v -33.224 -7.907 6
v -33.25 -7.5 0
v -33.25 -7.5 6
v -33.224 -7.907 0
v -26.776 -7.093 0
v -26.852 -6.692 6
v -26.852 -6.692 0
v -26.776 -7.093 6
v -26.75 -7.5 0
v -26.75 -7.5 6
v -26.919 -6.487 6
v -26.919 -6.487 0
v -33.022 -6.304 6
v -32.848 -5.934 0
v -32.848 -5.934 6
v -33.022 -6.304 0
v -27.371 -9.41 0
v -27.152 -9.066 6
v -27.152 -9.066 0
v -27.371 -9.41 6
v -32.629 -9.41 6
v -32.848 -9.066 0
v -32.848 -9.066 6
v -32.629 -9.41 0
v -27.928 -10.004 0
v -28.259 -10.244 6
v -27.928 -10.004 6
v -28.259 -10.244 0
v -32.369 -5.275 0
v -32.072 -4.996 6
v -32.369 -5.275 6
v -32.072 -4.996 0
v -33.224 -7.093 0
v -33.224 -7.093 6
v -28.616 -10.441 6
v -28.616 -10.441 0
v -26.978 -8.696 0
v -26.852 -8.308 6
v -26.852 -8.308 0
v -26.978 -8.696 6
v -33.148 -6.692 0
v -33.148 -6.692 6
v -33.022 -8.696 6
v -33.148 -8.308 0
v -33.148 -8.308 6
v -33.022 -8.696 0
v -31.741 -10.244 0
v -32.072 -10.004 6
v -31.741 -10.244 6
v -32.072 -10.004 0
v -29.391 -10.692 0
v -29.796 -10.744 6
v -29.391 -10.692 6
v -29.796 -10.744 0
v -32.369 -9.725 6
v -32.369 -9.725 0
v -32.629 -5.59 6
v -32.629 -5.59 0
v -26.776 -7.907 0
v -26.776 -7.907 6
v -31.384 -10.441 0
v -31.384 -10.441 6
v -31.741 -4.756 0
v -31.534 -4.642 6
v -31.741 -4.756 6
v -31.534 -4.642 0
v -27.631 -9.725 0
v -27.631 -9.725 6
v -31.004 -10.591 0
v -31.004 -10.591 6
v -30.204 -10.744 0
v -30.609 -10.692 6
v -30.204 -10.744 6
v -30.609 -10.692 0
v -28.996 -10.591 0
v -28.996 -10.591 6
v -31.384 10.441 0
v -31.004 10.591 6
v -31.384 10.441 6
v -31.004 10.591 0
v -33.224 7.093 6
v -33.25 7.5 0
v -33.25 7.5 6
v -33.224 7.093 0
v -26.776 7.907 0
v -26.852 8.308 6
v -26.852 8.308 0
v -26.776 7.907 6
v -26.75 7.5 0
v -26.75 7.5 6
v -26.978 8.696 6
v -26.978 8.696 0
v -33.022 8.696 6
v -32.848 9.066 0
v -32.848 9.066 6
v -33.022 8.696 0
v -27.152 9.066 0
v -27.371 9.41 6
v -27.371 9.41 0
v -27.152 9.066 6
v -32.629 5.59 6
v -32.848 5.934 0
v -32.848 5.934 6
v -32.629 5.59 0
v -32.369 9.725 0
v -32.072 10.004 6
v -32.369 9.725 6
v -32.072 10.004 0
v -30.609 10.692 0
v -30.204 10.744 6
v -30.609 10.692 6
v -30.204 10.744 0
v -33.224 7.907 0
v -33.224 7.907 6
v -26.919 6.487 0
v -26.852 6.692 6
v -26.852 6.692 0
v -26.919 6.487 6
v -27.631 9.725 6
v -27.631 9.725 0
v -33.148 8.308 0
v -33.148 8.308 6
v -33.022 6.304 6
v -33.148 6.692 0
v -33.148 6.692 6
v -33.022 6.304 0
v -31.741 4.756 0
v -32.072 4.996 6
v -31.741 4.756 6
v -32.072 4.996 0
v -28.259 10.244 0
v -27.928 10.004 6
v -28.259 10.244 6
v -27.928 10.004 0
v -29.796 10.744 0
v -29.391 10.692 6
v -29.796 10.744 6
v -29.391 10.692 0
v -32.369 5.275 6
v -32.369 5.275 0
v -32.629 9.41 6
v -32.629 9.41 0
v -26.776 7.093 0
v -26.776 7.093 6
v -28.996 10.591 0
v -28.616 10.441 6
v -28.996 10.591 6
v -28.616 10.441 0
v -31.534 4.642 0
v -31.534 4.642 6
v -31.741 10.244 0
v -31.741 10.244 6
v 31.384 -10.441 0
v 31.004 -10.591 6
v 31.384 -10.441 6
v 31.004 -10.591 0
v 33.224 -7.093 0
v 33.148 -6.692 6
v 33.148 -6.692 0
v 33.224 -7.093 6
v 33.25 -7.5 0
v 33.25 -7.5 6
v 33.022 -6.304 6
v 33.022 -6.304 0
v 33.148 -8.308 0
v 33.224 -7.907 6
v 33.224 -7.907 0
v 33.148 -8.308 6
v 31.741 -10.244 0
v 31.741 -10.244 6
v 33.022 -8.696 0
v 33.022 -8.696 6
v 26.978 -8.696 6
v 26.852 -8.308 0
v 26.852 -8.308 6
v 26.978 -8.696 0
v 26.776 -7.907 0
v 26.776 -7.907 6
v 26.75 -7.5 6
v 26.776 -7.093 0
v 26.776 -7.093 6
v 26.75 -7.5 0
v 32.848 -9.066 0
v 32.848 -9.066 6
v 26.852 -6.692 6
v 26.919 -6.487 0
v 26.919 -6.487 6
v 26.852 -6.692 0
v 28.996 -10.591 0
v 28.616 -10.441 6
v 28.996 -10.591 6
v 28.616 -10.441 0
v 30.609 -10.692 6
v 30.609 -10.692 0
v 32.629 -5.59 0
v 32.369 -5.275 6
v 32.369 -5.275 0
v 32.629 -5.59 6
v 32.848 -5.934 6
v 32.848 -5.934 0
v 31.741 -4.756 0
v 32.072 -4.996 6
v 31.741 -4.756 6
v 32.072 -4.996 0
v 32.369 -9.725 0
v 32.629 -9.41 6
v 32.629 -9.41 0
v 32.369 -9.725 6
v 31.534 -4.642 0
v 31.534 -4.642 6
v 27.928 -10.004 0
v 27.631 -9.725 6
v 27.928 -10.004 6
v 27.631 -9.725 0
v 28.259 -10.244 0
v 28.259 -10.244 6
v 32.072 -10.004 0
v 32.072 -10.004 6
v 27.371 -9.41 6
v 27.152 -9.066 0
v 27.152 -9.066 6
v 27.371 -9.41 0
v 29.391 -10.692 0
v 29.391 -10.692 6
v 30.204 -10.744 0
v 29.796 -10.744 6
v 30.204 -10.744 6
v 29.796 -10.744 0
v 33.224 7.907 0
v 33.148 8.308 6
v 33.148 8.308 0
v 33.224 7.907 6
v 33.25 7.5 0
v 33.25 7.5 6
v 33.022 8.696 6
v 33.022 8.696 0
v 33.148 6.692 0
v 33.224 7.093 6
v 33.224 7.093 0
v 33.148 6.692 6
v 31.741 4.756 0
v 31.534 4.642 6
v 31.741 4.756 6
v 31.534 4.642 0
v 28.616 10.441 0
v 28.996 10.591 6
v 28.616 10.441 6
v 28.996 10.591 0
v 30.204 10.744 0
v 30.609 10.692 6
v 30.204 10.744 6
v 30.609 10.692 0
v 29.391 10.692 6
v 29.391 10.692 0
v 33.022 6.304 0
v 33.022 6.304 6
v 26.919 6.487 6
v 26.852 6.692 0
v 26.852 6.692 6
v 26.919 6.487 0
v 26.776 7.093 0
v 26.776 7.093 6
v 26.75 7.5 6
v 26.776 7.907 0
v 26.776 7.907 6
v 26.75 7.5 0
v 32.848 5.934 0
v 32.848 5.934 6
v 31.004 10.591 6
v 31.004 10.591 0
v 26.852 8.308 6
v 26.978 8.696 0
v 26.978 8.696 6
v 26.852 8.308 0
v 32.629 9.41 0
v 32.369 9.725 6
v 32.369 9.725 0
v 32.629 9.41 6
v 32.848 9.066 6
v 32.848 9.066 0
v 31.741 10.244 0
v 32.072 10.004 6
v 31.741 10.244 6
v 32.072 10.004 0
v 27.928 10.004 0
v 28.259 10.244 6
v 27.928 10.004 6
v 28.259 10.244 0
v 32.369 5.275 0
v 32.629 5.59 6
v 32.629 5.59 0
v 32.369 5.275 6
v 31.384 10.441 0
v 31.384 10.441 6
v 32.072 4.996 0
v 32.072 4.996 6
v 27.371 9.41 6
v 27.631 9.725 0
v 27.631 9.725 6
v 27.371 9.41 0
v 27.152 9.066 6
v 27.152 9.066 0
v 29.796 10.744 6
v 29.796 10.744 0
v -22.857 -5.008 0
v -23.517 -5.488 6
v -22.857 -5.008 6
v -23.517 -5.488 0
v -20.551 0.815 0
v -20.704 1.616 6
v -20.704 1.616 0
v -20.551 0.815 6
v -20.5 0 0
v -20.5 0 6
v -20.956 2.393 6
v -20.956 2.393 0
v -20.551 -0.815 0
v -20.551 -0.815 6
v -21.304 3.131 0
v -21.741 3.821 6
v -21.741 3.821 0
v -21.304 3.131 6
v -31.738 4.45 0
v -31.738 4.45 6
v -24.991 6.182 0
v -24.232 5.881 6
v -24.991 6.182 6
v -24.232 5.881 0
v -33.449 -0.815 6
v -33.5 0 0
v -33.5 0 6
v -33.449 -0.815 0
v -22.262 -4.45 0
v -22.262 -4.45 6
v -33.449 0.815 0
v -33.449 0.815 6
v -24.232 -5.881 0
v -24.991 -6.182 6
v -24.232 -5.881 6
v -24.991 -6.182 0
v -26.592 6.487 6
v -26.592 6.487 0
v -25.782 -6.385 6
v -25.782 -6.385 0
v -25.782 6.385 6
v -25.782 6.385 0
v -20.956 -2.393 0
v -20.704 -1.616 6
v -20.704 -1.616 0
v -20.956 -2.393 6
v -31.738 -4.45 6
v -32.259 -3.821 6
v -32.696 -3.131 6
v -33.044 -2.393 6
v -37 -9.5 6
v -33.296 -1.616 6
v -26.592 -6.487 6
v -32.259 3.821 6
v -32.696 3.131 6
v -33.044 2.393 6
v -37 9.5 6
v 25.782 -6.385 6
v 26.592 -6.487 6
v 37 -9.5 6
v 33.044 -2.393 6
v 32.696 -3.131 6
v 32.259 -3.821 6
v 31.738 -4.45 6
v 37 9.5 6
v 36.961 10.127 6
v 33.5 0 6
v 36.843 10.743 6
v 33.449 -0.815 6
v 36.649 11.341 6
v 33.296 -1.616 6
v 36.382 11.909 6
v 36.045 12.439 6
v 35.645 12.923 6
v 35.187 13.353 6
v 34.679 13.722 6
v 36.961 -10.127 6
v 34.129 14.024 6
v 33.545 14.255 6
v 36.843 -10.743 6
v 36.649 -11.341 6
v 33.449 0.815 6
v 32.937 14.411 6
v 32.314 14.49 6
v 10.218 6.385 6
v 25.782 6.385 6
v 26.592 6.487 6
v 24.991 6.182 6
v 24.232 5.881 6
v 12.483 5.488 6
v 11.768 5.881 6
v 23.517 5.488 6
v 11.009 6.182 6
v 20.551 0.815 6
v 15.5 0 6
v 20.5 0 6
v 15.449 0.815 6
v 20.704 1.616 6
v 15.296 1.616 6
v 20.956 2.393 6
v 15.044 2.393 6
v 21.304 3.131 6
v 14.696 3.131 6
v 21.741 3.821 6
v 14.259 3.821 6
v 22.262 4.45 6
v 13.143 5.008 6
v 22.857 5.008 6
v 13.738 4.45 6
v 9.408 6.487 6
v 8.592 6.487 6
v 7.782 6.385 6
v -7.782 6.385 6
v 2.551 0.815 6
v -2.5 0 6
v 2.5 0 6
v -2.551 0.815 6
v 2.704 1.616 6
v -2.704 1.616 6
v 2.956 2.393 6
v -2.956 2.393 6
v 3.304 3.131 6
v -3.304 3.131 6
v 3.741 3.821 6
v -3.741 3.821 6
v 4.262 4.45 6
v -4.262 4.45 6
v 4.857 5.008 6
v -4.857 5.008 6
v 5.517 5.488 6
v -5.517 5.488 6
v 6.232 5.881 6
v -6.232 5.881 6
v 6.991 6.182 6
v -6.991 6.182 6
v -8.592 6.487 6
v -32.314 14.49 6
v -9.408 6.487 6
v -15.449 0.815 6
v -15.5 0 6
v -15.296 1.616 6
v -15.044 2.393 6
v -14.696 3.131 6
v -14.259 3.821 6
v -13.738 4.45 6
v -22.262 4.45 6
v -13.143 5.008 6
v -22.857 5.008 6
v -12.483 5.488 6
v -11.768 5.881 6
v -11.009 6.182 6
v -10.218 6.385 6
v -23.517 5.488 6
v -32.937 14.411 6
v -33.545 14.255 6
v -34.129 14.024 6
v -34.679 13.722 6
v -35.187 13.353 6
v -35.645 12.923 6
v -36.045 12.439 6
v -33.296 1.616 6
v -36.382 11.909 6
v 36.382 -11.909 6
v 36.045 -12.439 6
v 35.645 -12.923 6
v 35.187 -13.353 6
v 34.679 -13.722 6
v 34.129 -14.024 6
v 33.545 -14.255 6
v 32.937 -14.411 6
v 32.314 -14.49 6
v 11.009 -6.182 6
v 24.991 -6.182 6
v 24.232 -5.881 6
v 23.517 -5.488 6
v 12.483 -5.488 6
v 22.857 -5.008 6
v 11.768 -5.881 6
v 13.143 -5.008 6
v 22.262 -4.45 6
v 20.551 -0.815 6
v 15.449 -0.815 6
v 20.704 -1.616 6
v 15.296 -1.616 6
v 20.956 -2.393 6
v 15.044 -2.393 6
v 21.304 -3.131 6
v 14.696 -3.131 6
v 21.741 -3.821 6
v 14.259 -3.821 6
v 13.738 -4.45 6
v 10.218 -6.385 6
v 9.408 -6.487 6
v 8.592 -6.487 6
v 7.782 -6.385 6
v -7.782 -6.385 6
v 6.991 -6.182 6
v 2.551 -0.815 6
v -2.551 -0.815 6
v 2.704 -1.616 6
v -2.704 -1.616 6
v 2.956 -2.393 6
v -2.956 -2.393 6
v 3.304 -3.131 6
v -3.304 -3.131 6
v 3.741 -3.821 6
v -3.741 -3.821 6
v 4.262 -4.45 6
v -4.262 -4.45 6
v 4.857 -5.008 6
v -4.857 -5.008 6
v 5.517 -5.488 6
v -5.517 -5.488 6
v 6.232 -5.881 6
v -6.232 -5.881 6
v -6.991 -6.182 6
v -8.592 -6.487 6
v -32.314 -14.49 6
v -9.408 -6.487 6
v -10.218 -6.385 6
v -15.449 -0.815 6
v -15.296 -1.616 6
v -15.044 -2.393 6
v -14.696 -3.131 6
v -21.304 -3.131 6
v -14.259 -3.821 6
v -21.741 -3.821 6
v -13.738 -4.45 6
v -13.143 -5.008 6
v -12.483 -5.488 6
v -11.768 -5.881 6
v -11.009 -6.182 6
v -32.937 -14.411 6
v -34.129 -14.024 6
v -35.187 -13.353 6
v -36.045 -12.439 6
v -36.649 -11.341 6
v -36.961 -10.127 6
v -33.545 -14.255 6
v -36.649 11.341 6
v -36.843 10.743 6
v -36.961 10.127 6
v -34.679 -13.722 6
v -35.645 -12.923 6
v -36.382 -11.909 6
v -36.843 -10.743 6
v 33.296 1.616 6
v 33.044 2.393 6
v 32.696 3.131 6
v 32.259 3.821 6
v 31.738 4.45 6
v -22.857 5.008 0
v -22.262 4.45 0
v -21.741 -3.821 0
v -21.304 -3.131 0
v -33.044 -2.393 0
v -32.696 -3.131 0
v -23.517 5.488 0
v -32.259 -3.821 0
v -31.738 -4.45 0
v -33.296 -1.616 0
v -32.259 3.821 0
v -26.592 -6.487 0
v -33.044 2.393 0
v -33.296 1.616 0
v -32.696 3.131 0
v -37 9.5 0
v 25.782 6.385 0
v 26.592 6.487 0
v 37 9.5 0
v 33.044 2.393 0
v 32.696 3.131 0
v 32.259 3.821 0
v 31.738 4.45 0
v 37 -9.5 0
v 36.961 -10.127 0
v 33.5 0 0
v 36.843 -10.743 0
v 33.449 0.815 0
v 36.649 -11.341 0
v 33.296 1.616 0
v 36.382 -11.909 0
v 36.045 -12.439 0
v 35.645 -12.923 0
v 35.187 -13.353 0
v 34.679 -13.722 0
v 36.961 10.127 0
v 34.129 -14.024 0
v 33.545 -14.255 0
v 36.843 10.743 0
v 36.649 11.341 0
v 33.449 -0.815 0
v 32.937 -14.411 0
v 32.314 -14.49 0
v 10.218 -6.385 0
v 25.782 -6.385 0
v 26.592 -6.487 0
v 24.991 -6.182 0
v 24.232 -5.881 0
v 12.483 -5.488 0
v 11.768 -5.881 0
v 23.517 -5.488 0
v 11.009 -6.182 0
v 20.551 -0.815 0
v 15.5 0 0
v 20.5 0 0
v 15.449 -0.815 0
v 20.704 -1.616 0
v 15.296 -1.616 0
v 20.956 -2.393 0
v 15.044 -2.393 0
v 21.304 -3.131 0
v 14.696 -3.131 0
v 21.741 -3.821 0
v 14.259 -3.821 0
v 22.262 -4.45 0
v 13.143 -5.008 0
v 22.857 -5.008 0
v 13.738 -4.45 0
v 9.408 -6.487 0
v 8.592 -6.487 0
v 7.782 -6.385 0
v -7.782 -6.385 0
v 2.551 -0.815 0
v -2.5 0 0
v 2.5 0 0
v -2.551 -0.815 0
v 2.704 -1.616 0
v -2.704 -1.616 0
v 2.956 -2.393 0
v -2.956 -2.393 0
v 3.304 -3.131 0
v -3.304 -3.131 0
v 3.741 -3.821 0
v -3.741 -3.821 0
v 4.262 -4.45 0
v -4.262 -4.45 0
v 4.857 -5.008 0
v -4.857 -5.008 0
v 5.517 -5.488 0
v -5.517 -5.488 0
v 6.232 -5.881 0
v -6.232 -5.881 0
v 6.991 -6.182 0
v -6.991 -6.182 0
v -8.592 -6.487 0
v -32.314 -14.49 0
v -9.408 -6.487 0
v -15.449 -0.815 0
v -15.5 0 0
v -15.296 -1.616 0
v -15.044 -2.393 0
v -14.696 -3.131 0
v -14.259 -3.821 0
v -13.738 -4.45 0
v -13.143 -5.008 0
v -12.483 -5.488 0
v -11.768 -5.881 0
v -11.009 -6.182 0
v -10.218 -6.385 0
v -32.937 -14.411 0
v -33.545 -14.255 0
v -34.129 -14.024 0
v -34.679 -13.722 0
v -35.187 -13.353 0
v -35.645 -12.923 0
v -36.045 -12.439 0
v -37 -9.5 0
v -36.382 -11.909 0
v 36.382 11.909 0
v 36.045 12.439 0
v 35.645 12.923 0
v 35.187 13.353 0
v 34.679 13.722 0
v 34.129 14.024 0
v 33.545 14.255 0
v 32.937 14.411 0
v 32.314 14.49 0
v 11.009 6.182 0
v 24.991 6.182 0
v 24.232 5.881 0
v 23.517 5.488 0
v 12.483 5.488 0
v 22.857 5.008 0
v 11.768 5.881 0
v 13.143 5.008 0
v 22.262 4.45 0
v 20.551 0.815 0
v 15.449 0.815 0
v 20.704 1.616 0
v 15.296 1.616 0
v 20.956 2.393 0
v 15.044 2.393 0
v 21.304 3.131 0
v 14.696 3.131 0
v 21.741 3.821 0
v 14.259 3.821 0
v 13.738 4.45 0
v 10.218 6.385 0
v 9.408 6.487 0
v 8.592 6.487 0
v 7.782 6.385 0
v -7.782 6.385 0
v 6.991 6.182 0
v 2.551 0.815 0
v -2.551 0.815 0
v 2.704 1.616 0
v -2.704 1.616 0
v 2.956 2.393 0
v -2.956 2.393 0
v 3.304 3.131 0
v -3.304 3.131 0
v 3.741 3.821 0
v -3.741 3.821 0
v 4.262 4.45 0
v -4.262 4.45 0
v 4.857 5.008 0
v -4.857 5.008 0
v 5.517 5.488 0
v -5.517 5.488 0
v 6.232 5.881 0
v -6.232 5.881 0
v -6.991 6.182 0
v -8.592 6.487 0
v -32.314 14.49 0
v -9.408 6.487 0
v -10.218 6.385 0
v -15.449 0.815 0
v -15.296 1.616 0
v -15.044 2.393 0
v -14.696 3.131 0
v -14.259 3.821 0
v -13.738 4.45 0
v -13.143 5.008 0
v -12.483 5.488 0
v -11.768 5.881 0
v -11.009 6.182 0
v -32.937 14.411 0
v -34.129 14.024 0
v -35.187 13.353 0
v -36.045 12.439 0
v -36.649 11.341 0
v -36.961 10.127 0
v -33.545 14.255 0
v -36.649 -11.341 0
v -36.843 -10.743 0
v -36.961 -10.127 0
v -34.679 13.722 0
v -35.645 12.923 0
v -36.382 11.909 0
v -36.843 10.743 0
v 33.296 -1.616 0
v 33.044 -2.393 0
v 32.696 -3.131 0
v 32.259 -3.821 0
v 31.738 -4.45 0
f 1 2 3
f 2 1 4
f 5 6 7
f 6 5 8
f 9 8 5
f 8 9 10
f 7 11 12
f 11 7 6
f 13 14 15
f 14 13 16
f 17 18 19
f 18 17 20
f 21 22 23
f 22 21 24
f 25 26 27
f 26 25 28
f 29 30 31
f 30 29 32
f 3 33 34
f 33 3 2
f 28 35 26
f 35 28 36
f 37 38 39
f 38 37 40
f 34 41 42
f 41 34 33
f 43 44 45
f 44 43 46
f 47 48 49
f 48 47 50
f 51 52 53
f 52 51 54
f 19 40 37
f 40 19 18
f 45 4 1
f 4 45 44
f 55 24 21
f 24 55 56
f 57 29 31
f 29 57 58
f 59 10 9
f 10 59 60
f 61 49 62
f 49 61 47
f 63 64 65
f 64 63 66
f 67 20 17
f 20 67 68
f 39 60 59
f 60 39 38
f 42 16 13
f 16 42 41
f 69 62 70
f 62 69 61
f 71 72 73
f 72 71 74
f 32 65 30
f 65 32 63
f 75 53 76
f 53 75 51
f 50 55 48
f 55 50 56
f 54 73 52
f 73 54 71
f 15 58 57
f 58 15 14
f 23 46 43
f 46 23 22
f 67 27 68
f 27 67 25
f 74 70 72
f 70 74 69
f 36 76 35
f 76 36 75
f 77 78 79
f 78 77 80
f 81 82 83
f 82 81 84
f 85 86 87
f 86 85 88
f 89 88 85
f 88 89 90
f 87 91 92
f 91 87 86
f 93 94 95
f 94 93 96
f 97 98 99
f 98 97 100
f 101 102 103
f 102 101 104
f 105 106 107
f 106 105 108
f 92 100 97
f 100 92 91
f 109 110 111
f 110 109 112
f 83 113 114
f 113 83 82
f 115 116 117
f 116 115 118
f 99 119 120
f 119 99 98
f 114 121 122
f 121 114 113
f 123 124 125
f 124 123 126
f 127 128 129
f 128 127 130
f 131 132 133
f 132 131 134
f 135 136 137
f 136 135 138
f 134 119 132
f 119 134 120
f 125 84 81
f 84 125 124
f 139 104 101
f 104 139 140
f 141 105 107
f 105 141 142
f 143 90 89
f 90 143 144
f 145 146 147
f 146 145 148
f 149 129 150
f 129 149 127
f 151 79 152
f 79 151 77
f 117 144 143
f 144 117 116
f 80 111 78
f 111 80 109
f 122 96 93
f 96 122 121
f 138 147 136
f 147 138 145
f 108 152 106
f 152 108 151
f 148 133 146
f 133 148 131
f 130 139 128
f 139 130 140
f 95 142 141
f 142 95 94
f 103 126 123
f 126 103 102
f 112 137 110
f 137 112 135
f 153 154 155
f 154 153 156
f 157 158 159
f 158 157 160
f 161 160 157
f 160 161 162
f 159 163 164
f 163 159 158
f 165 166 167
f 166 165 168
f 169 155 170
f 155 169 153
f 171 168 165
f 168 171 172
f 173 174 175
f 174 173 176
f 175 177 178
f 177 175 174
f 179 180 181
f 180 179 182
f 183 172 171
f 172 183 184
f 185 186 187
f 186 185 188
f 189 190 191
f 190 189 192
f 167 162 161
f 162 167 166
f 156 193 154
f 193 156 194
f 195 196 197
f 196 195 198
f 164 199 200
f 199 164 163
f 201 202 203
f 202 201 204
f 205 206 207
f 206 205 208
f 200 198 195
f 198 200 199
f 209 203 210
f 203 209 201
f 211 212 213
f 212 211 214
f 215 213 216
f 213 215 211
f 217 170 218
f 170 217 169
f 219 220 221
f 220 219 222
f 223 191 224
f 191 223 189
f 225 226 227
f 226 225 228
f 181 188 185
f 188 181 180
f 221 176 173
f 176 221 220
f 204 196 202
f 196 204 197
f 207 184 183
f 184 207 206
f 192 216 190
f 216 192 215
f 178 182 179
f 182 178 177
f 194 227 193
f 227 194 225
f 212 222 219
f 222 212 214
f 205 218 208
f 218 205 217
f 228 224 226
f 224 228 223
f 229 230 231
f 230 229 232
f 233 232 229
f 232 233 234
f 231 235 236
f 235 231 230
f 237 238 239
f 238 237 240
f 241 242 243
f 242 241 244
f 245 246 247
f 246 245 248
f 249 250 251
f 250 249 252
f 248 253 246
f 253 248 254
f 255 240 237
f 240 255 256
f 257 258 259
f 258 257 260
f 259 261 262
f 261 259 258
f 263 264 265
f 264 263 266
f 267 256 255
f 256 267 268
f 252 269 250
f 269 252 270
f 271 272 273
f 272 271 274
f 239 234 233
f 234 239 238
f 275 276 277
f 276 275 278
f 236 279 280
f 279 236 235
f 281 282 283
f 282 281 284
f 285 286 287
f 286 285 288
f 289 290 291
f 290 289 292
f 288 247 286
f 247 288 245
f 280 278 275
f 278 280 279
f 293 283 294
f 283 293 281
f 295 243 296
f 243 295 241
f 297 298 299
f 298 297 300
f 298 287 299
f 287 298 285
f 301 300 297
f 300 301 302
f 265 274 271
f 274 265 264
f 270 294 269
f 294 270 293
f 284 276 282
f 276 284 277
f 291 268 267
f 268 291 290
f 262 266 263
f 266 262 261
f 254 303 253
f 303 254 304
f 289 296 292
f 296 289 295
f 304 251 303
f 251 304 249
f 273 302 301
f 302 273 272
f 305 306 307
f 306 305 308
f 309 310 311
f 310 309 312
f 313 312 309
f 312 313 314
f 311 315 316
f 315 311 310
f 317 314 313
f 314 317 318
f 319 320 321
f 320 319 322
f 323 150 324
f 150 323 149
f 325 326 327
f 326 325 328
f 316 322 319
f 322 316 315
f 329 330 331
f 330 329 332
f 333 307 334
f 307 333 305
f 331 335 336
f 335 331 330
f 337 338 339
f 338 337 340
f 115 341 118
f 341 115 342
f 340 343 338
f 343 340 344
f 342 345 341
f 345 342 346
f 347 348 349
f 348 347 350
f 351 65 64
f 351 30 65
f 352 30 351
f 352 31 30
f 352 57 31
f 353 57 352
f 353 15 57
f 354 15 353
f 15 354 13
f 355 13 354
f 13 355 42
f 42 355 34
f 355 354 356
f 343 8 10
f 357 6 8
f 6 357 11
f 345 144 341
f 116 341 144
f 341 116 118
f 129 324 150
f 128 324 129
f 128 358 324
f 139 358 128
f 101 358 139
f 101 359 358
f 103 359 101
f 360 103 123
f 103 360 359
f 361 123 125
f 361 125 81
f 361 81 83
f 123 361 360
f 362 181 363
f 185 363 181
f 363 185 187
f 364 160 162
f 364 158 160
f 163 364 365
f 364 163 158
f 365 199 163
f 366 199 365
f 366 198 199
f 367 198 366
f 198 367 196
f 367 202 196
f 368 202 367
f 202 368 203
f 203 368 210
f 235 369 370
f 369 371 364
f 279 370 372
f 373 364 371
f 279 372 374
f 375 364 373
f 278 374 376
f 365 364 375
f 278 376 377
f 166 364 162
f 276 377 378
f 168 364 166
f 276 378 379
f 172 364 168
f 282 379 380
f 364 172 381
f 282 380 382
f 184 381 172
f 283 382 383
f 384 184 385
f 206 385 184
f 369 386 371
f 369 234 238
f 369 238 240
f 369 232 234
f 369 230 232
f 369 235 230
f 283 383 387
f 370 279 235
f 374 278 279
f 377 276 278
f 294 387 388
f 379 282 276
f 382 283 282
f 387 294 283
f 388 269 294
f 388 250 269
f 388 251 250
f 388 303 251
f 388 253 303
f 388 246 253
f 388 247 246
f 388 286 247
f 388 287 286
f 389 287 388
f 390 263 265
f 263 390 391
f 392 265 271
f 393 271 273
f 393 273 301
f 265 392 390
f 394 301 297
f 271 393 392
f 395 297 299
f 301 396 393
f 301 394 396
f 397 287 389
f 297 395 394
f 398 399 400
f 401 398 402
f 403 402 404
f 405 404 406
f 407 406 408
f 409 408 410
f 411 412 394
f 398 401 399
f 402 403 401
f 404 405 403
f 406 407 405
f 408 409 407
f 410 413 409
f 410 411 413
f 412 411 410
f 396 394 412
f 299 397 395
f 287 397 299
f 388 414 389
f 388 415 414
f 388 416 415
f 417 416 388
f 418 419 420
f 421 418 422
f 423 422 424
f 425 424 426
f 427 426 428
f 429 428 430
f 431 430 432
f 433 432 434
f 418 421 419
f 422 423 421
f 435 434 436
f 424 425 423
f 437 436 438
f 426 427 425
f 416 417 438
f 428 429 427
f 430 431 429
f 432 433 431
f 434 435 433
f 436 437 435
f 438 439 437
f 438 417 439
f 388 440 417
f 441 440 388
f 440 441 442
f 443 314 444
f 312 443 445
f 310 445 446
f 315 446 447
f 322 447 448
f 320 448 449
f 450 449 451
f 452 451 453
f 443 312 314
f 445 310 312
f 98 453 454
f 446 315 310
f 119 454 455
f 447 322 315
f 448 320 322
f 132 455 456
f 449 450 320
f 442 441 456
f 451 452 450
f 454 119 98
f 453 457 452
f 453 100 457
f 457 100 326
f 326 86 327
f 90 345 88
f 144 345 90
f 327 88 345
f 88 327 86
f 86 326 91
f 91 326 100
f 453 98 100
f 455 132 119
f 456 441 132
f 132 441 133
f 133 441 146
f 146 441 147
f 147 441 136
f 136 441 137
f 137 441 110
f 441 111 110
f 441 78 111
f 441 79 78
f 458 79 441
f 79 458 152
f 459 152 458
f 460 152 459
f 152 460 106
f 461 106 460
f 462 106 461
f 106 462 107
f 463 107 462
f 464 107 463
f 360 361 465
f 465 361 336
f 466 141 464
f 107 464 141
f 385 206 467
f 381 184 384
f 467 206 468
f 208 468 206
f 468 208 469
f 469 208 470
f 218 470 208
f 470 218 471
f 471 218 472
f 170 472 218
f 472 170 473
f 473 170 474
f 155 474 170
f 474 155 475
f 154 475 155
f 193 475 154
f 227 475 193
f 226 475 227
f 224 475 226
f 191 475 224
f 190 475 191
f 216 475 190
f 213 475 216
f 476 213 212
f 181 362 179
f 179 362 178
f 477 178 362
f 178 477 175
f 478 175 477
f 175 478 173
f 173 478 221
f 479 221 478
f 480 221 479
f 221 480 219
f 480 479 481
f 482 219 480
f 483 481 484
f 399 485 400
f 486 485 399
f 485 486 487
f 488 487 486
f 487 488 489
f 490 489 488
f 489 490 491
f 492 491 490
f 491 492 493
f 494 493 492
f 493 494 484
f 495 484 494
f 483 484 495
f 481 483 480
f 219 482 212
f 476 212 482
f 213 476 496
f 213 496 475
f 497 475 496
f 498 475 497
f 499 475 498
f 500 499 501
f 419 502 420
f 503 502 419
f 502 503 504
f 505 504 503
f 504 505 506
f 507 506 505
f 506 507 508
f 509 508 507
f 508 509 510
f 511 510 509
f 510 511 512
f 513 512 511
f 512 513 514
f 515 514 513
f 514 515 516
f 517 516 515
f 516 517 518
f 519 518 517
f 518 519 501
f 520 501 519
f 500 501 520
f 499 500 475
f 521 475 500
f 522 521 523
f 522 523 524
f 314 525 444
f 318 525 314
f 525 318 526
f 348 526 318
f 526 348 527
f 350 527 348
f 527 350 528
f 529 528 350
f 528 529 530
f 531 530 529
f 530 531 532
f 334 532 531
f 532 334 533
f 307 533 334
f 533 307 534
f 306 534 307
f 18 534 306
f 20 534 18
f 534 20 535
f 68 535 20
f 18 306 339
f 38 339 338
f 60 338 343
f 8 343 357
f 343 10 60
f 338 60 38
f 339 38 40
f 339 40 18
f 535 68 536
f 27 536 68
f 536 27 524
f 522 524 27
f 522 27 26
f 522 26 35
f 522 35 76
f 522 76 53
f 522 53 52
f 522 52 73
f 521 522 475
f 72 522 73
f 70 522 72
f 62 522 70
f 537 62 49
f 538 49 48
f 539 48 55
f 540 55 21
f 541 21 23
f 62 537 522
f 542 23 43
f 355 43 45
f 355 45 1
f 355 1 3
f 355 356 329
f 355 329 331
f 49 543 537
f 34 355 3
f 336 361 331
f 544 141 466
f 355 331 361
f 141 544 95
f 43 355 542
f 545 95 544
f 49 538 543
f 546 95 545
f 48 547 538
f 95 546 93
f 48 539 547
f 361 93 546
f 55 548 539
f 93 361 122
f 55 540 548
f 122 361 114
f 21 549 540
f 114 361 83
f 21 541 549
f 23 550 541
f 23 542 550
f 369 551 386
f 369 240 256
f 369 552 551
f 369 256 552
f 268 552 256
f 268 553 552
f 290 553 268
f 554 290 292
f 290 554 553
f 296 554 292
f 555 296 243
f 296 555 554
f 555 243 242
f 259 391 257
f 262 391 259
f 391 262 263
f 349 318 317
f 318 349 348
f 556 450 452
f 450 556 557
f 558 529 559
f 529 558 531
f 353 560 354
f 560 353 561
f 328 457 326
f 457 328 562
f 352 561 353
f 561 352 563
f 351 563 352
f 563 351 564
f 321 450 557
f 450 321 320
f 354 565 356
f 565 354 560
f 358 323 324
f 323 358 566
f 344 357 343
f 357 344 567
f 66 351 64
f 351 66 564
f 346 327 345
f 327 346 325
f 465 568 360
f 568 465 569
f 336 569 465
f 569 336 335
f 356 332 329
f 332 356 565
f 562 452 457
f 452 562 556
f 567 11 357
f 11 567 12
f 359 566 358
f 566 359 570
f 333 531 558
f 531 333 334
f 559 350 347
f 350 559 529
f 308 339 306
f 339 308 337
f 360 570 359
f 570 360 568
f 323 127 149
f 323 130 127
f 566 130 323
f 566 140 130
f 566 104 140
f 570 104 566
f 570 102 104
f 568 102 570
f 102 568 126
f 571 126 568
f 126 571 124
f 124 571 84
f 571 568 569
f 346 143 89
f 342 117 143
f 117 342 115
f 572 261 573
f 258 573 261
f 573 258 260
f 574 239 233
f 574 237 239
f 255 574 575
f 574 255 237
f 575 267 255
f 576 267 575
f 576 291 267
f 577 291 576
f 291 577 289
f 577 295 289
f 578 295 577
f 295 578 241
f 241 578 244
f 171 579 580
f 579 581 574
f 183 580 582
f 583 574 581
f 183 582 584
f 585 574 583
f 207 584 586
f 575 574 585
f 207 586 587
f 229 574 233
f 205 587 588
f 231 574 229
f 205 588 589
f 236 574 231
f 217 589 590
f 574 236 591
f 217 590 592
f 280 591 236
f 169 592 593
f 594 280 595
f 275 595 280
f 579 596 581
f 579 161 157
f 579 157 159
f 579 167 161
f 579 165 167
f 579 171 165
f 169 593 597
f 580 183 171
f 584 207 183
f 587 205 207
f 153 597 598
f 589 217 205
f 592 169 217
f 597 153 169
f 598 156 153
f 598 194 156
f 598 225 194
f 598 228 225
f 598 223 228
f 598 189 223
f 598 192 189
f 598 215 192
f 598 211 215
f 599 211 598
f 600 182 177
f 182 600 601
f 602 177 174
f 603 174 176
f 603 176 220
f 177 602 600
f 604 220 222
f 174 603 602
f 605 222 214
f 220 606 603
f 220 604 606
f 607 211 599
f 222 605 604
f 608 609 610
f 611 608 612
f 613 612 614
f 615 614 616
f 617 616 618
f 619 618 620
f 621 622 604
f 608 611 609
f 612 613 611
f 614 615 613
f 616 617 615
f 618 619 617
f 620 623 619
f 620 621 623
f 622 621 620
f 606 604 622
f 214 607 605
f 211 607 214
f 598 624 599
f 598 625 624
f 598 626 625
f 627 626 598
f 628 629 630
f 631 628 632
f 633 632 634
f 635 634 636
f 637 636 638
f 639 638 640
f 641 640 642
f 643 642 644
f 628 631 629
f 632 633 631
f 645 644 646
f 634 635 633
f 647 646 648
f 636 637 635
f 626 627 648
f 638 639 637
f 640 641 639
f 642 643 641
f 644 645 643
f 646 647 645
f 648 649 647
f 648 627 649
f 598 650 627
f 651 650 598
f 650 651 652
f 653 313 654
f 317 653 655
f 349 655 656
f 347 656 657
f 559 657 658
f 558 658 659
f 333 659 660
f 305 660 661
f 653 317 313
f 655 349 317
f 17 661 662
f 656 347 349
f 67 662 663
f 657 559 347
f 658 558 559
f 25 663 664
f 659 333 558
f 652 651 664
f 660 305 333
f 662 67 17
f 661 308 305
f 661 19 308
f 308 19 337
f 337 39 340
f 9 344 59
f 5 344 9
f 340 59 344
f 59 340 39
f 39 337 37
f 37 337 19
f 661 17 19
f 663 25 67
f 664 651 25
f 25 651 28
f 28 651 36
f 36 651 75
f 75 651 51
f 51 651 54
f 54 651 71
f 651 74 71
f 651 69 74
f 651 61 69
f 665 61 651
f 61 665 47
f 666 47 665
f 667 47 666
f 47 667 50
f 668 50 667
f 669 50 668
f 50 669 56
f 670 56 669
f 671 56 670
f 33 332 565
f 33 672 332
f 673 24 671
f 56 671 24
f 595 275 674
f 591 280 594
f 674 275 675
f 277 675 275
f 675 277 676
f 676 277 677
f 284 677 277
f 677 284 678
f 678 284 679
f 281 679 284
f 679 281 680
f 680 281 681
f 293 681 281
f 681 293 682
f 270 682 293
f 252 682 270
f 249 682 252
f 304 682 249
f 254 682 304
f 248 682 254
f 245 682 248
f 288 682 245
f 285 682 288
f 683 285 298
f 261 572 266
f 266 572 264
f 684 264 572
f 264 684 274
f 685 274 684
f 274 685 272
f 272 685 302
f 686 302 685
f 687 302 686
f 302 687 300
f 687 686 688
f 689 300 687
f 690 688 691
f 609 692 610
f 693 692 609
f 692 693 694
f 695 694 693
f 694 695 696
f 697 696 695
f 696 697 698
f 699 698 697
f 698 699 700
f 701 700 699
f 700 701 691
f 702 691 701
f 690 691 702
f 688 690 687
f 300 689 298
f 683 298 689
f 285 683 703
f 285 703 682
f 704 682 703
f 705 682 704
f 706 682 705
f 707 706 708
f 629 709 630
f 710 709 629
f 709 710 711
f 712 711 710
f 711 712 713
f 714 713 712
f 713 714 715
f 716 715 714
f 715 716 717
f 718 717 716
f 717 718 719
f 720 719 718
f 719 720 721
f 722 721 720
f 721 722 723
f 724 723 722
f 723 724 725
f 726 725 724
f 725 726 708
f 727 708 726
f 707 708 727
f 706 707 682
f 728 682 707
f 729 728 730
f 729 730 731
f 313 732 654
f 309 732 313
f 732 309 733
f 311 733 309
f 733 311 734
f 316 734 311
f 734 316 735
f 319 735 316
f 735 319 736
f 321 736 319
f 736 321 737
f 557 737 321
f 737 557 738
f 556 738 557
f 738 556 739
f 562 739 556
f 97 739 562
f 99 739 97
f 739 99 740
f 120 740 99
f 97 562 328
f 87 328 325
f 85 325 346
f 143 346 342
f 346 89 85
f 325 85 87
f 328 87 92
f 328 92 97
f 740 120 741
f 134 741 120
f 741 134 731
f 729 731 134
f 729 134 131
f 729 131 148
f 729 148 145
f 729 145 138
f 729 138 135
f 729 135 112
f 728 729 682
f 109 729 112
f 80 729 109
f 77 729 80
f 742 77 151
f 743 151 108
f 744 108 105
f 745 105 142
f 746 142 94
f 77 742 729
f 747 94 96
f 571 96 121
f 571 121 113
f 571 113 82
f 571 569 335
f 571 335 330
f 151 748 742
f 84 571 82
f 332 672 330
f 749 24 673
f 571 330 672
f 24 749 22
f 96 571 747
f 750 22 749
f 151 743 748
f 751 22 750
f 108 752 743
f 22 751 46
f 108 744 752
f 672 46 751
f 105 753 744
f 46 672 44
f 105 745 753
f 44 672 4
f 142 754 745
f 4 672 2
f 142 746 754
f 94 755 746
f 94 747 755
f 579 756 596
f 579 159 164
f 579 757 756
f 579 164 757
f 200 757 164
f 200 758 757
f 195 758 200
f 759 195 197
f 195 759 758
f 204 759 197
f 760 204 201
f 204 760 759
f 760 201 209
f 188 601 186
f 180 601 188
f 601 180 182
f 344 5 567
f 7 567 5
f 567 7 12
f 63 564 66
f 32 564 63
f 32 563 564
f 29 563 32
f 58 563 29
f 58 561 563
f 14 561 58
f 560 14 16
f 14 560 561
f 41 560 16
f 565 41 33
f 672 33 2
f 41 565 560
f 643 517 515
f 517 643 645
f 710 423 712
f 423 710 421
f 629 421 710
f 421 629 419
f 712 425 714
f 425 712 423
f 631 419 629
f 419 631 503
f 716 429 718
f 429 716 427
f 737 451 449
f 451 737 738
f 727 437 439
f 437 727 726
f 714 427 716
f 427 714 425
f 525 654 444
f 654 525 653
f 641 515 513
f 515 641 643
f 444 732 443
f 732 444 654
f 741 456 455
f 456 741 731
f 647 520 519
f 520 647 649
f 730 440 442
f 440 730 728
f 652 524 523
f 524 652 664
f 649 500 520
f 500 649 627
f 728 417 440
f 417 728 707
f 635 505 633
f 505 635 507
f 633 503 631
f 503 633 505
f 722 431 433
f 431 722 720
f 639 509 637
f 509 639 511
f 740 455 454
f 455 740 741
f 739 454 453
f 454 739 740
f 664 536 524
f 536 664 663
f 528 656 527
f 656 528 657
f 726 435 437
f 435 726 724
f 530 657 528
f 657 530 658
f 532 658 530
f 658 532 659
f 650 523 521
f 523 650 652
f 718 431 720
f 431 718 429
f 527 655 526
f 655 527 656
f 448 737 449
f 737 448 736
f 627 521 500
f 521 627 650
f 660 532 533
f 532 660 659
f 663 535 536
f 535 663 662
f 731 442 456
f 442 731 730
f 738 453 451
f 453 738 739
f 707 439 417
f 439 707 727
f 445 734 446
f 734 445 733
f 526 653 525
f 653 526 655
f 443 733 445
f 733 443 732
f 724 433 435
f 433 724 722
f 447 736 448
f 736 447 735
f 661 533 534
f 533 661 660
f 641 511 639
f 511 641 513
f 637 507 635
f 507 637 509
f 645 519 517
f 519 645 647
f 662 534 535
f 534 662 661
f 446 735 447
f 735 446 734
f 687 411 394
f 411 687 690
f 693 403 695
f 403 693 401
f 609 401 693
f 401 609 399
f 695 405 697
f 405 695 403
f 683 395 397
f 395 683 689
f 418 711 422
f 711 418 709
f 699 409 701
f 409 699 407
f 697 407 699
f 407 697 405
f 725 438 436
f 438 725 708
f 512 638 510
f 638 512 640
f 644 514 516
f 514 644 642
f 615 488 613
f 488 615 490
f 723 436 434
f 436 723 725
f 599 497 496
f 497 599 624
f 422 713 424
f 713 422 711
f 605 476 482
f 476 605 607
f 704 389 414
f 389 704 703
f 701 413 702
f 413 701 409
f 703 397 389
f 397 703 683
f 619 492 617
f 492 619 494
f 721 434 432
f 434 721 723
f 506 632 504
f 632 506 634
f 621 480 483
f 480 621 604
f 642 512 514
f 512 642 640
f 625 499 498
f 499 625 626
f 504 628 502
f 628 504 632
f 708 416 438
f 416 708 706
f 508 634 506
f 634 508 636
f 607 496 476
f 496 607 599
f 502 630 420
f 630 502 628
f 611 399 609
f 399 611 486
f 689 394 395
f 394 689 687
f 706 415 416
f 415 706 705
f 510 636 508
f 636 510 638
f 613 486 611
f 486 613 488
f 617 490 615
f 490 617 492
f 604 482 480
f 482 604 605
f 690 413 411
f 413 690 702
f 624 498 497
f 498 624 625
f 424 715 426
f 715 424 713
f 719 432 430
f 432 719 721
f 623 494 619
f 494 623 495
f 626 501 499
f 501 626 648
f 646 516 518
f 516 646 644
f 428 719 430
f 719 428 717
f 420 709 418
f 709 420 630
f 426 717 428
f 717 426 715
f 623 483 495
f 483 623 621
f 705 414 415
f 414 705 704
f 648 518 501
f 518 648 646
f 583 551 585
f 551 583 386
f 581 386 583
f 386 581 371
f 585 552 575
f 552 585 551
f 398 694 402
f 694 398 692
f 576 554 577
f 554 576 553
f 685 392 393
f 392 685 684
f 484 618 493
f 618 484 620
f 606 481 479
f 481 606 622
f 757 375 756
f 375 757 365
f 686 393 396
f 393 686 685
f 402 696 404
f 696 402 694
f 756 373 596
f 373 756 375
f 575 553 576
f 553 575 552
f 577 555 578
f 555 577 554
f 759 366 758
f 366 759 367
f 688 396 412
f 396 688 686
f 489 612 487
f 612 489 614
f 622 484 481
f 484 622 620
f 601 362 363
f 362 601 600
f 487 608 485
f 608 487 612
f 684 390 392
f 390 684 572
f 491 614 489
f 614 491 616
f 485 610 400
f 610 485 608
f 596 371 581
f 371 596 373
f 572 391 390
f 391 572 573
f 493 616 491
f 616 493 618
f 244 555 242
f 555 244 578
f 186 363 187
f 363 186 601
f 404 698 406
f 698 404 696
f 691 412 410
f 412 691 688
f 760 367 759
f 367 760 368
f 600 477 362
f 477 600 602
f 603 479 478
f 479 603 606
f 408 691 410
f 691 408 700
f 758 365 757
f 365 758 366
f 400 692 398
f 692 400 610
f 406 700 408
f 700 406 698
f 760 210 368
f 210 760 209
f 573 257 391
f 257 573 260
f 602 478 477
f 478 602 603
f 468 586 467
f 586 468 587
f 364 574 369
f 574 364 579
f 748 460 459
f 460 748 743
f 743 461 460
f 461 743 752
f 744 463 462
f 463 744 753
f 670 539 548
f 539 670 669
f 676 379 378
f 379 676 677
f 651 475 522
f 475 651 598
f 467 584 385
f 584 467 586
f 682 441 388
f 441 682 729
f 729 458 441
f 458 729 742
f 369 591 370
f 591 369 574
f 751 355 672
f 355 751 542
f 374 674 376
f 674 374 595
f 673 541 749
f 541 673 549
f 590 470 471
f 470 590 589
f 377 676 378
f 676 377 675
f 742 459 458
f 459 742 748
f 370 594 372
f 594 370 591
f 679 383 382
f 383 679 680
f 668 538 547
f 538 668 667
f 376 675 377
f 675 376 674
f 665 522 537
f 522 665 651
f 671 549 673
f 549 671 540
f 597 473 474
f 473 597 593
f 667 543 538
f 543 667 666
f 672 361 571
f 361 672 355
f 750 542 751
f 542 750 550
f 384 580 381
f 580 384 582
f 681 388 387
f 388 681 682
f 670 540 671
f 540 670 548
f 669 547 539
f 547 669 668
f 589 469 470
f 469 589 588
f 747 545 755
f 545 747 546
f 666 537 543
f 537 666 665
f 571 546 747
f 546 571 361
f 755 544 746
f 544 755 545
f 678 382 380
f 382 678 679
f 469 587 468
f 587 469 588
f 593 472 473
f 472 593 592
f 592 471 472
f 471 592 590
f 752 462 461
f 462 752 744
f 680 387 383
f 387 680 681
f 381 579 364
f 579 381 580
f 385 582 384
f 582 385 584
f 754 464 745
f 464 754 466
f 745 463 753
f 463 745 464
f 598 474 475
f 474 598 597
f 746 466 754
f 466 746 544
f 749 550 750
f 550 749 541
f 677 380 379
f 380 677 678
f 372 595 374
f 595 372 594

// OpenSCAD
$fn = 50;

difference() {
	union() {
		hull() {
			translate(v = [-32.0, 9.5, 0]) {
				cylinder(h = 6, r = 5);
			}
			translate(v = [32.0, 9.5, 0]) {
				cylinder(h = 6, r = 5);
			}
			translate(v = [-32.0, -9.5, 0]) {
				cylinder(h = 6, r = 5);
			}
			translate(v = [32.0, -9.5, 0]) {
				cylinder(h = 6, r = 5);
			}
		}
	}
	union() {
		translate(v = [-30.0, -7.5, -100.0]) {
			cylinder(h = 200, r = 3.25);
		}
		translate(v = [-30.0, 7.5, -100.0]) {
			cylinder(h = 200, r = 3.25);
		}
		translate(v = [30.0, -7.5, -100.0]) {
			cylinder(h = 200, r = 3.25);
		}
		translate(v = [30.0, 7.5, -100.0]) {
			cylinder(h = 200, r = 3.25);
		}
		translate(v = [-30.0, -7.5, -100.0]) {
			cylinder(h = 200, r = 1.8);
		}
		translate(v = [-30.0, 7.5, -100.0]) {
			cylinder(h = 200, r = 1.8);
		}
		translate(v = [30.0, -7.5, -100.0]) {
			cylinder(h = 200, r = 1.8);
		}
		translate(v = [30.0, 7.5, -100.0]) {
			cylinder(h = 200, r = 1.8);
		}
		translate(v = [-27.0, 0, 0.0]) {
			cylinder(h = 6, r = 6.5);
		}
		translate(v = [-9.0, 0, 0.0]) {
			cylinder(h = 6, r = 6.5);
		}
		translate(v = [9.0, 0, 0.0]) {
			cylinder(h = 6, r = 6.5);
		}
		translate(v = [27.0, 0, 0.0]) {
			cylinder(h = 6, r = 6.5);
		}
	}
}
